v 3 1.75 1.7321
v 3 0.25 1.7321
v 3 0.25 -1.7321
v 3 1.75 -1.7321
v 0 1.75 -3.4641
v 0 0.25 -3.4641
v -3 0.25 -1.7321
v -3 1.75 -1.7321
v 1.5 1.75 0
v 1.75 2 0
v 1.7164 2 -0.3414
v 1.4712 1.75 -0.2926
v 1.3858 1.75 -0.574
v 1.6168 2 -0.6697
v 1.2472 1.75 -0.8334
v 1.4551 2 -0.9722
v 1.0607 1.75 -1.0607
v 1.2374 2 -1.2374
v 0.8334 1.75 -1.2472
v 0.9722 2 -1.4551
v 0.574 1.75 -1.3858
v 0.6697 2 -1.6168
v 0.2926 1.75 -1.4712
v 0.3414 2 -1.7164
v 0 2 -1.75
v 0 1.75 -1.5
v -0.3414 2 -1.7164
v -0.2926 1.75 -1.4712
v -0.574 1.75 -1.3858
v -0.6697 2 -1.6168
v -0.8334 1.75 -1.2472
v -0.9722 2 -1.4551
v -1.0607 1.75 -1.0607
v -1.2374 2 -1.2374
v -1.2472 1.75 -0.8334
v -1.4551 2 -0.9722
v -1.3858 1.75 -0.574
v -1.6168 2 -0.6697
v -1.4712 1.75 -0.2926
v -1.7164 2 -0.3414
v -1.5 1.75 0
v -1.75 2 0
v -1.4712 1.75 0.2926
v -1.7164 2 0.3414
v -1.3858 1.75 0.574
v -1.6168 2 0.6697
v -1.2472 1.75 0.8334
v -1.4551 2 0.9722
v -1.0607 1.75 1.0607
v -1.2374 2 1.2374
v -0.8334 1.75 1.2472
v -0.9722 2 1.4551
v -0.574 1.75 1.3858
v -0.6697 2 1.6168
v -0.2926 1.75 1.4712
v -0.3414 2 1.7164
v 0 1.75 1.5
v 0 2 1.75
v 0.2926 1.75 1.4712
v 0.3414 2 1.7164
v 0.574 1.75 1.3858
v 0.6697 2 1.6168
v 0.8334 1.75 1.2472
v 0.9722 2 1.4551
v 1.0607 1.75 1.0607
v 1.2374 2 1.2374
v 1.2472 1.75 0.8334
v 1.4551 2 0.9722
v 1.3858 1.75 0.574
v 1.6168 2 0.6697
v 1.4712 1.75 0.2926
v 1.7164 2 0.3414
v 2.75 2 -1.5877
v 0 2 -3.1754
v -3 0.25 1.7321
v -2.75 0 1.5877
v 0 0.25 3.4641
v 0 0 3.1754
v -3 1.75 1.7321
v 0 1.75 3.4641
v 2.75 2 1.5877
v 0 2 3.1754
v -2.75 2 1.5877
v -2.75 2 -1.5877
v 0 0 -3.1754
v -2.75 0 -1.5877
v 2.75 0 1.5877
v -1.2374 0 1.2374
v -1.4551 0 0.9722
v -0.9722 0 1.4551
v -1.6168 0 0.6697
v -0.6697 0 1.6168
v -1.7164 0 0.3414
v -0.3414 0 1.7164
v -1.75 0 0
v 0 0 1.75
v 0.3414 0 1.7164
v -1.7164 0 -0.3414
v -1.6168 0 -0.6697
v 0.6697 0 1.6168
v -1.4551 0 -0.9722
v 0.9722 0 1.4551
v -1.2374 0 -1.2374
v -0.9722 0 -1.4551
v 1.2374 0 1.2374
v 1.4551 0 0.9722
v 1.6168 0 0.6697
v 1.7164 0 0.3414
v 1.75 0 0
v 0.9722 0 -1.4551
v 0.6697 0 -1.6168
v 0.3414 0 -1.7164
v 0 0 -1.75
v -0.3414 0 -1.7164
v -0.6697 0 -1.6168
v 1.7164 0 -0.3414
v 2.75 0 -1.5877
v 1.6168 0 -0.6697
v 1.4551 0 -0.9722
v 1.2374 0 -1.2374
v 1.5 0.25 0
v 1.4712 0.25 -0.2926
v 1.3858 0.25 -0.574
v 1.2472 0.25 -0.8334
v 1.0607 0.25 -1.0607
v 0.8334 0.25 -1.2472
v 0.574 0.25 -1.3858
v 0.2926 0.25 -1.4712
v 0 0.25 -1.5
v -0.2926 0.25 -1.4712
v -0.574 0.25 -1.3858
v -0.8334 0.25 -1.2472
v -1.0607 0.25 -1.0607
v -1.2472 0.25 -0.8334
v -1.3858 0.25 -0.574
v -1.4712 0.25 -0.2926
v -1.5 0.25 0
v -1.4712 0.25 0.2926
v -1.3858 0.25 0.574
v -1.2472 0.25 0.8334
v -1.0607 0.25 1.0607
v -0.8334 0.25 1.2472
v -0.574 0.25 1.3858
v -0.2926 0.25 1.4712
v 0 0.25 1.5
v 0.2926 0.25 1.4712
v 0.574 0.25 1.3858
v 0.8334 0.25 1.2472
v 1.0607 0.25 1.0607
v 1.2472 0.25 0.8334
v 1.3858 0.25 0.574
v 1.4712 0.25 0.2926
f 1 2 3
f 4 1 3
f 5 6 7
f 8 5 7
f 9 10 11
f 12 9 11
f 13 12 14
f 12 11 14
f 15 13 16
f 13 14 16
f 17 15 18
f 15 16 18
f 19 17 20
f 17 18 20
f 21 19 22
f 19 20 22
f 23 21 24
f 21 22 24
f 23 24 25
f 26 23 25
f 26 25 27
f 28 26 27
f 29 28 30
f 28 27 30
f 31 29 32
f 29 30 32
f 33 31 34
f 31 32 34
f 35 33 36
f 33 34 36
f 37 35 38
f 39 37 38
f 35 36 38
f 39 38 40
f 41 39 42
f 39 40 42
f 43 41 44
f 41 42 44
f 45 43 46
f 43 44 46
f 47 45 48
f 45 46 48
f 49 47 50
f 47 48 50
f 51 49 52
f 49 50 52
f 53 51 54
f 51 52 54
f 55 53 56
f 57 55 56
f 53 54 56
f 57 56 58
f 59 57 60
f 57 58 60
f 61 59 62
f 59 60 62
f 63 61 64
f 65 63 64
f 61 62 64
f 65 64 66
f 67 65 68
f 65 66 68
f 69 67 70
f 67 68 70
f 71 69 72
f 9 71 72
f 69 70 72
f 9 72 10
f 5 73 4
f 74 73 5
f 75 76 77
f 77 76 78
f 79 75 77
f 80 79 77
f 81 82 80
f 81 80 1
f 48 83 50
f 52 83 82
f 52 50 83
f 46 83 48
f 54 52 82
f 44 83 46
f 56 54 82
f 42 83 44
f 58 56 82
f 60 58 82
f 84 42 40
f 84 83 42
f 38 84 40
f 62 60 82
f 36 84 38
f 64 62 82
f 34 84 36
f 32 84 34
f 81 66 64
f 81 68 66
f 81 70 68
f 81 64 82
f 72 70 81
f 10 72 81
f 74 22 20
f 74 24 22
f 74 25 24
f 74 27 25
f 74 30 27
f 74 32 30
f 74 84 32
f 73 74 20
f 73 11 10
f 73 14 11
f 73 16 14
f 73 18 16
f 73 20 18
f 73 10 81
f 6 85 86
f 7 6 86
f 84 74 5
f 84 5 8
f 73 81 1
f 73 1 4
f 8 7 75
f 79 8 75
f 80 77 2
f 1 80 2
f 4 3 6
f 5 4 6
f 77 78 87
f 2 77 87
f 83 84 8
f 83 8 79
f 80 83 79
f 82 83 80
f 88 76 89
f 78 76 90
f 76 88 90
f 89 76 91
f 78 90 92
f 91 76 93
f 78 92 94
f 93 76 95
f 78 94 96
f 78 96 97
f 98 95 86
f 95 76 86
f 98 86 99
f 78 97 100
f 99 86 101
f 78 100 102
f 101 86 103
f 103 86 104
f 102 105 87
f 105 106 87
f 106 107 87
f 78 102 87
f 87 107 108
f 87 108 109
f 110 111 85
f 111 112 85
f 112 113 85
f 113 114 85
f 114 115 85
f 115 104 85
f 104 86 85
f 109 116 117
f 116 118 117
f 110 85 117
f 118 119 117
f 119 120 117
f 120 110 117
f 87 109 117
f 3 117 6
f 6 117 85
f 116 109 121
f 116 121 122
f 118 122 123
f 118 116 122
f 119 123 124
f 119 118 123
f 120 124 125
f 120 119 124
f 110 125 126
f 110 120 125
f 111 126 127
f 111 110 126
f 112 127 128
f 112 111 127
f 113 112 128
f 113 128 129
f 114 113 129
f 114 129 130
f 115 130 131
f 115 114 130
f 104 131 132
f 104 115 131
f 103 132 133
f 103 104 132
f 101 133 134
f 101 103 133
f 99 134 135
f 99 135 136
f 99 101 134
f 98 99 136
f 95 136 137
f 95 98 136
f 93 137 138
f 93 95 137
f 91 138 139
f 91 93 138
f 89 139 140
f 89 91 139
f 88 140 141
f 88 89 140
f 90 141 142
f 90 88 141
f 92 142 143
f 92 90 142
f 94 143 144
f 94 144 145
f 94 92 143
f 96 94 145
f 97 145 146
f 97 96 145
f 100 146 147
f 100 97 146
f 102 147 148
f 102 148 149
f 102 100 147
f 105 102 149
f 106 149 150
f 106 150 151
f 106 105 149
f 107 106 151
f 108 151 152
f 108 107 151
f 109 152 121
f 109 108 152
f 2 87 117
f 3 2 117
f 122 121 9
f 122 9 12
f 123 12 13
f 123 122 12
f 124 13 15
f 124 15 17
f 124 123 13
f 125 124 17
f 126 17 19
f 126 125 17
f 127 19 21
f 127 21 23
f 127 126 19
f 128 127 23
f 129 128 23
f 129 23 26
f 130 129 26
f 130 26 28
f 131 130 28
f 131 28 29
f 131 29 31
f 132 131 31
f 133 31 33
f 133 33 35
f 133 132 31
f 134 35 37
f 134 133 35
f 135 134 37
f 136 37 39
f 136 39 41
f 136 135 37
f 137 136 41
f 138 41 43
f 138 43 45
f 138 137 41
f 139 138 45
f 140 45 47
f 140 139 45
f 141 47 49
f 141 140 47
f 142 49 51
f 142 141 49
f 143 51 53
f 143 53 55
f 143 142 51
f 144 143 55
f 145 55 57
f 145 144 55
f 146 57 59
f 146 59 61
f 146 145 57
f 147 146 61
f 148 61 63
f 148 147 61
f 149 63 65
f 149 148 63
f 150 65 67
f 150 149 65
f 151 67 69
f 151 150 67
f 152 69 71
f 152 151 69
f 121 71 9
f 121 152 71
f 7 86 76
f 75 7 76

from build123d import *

# Parameters (mm, degrees)
SKETCH1_R           = 1.5
BOSS_EXTRUDE1_DEPTH = 2
CHAMFER1_SIZE       = 0.25


with BuildPart() as part:
    # Sketch1 → Boss-Extrude1 (new body)
    with BuildSketch(Plane(origin=(0, 0, 0), x_dir=(1, 0, 0), z_dir=(0, 1, 0))):
        Polygon((0, -3.464101615), (3, -1.732050808), (3, 1.732050808), (0, 3.464101615), (-3, 1.732050808), (-3, -1.732050808), align=None)
        Circle(SKETCH1_R, mode=Mode.SUBTRACT)
    extrude(amount=BOSS_EXTRUDE1_DEPTH)

    # Chamfer1
    chamfer1_edges = [part.edges().sort_by_distance(p)[0] for p in [
        (3, 2, 0),
        (1.5, 2, -2.598076211),
        (-1.5, 0, 0),
        (-1.5, 2, 0),
        (-1.5, 2, -2.598076211),
        (-3, 2, 0),
        (-1.5, 2, 2.598076211),
        (-3, 0, 0),
        (-1.5, 0, -2.598076211),
        (1.5, 0, -2.598076211),
        (3, 0, 0),
        (1.5, 0, 2.598076211),
        (-1.5, 0, 2.598076211),
        (1.5, 2, 2.598076211),
    ]]
    chamfer(chamfer1_edges, length=CHAMFER1_SIZE)


solid = part.part
